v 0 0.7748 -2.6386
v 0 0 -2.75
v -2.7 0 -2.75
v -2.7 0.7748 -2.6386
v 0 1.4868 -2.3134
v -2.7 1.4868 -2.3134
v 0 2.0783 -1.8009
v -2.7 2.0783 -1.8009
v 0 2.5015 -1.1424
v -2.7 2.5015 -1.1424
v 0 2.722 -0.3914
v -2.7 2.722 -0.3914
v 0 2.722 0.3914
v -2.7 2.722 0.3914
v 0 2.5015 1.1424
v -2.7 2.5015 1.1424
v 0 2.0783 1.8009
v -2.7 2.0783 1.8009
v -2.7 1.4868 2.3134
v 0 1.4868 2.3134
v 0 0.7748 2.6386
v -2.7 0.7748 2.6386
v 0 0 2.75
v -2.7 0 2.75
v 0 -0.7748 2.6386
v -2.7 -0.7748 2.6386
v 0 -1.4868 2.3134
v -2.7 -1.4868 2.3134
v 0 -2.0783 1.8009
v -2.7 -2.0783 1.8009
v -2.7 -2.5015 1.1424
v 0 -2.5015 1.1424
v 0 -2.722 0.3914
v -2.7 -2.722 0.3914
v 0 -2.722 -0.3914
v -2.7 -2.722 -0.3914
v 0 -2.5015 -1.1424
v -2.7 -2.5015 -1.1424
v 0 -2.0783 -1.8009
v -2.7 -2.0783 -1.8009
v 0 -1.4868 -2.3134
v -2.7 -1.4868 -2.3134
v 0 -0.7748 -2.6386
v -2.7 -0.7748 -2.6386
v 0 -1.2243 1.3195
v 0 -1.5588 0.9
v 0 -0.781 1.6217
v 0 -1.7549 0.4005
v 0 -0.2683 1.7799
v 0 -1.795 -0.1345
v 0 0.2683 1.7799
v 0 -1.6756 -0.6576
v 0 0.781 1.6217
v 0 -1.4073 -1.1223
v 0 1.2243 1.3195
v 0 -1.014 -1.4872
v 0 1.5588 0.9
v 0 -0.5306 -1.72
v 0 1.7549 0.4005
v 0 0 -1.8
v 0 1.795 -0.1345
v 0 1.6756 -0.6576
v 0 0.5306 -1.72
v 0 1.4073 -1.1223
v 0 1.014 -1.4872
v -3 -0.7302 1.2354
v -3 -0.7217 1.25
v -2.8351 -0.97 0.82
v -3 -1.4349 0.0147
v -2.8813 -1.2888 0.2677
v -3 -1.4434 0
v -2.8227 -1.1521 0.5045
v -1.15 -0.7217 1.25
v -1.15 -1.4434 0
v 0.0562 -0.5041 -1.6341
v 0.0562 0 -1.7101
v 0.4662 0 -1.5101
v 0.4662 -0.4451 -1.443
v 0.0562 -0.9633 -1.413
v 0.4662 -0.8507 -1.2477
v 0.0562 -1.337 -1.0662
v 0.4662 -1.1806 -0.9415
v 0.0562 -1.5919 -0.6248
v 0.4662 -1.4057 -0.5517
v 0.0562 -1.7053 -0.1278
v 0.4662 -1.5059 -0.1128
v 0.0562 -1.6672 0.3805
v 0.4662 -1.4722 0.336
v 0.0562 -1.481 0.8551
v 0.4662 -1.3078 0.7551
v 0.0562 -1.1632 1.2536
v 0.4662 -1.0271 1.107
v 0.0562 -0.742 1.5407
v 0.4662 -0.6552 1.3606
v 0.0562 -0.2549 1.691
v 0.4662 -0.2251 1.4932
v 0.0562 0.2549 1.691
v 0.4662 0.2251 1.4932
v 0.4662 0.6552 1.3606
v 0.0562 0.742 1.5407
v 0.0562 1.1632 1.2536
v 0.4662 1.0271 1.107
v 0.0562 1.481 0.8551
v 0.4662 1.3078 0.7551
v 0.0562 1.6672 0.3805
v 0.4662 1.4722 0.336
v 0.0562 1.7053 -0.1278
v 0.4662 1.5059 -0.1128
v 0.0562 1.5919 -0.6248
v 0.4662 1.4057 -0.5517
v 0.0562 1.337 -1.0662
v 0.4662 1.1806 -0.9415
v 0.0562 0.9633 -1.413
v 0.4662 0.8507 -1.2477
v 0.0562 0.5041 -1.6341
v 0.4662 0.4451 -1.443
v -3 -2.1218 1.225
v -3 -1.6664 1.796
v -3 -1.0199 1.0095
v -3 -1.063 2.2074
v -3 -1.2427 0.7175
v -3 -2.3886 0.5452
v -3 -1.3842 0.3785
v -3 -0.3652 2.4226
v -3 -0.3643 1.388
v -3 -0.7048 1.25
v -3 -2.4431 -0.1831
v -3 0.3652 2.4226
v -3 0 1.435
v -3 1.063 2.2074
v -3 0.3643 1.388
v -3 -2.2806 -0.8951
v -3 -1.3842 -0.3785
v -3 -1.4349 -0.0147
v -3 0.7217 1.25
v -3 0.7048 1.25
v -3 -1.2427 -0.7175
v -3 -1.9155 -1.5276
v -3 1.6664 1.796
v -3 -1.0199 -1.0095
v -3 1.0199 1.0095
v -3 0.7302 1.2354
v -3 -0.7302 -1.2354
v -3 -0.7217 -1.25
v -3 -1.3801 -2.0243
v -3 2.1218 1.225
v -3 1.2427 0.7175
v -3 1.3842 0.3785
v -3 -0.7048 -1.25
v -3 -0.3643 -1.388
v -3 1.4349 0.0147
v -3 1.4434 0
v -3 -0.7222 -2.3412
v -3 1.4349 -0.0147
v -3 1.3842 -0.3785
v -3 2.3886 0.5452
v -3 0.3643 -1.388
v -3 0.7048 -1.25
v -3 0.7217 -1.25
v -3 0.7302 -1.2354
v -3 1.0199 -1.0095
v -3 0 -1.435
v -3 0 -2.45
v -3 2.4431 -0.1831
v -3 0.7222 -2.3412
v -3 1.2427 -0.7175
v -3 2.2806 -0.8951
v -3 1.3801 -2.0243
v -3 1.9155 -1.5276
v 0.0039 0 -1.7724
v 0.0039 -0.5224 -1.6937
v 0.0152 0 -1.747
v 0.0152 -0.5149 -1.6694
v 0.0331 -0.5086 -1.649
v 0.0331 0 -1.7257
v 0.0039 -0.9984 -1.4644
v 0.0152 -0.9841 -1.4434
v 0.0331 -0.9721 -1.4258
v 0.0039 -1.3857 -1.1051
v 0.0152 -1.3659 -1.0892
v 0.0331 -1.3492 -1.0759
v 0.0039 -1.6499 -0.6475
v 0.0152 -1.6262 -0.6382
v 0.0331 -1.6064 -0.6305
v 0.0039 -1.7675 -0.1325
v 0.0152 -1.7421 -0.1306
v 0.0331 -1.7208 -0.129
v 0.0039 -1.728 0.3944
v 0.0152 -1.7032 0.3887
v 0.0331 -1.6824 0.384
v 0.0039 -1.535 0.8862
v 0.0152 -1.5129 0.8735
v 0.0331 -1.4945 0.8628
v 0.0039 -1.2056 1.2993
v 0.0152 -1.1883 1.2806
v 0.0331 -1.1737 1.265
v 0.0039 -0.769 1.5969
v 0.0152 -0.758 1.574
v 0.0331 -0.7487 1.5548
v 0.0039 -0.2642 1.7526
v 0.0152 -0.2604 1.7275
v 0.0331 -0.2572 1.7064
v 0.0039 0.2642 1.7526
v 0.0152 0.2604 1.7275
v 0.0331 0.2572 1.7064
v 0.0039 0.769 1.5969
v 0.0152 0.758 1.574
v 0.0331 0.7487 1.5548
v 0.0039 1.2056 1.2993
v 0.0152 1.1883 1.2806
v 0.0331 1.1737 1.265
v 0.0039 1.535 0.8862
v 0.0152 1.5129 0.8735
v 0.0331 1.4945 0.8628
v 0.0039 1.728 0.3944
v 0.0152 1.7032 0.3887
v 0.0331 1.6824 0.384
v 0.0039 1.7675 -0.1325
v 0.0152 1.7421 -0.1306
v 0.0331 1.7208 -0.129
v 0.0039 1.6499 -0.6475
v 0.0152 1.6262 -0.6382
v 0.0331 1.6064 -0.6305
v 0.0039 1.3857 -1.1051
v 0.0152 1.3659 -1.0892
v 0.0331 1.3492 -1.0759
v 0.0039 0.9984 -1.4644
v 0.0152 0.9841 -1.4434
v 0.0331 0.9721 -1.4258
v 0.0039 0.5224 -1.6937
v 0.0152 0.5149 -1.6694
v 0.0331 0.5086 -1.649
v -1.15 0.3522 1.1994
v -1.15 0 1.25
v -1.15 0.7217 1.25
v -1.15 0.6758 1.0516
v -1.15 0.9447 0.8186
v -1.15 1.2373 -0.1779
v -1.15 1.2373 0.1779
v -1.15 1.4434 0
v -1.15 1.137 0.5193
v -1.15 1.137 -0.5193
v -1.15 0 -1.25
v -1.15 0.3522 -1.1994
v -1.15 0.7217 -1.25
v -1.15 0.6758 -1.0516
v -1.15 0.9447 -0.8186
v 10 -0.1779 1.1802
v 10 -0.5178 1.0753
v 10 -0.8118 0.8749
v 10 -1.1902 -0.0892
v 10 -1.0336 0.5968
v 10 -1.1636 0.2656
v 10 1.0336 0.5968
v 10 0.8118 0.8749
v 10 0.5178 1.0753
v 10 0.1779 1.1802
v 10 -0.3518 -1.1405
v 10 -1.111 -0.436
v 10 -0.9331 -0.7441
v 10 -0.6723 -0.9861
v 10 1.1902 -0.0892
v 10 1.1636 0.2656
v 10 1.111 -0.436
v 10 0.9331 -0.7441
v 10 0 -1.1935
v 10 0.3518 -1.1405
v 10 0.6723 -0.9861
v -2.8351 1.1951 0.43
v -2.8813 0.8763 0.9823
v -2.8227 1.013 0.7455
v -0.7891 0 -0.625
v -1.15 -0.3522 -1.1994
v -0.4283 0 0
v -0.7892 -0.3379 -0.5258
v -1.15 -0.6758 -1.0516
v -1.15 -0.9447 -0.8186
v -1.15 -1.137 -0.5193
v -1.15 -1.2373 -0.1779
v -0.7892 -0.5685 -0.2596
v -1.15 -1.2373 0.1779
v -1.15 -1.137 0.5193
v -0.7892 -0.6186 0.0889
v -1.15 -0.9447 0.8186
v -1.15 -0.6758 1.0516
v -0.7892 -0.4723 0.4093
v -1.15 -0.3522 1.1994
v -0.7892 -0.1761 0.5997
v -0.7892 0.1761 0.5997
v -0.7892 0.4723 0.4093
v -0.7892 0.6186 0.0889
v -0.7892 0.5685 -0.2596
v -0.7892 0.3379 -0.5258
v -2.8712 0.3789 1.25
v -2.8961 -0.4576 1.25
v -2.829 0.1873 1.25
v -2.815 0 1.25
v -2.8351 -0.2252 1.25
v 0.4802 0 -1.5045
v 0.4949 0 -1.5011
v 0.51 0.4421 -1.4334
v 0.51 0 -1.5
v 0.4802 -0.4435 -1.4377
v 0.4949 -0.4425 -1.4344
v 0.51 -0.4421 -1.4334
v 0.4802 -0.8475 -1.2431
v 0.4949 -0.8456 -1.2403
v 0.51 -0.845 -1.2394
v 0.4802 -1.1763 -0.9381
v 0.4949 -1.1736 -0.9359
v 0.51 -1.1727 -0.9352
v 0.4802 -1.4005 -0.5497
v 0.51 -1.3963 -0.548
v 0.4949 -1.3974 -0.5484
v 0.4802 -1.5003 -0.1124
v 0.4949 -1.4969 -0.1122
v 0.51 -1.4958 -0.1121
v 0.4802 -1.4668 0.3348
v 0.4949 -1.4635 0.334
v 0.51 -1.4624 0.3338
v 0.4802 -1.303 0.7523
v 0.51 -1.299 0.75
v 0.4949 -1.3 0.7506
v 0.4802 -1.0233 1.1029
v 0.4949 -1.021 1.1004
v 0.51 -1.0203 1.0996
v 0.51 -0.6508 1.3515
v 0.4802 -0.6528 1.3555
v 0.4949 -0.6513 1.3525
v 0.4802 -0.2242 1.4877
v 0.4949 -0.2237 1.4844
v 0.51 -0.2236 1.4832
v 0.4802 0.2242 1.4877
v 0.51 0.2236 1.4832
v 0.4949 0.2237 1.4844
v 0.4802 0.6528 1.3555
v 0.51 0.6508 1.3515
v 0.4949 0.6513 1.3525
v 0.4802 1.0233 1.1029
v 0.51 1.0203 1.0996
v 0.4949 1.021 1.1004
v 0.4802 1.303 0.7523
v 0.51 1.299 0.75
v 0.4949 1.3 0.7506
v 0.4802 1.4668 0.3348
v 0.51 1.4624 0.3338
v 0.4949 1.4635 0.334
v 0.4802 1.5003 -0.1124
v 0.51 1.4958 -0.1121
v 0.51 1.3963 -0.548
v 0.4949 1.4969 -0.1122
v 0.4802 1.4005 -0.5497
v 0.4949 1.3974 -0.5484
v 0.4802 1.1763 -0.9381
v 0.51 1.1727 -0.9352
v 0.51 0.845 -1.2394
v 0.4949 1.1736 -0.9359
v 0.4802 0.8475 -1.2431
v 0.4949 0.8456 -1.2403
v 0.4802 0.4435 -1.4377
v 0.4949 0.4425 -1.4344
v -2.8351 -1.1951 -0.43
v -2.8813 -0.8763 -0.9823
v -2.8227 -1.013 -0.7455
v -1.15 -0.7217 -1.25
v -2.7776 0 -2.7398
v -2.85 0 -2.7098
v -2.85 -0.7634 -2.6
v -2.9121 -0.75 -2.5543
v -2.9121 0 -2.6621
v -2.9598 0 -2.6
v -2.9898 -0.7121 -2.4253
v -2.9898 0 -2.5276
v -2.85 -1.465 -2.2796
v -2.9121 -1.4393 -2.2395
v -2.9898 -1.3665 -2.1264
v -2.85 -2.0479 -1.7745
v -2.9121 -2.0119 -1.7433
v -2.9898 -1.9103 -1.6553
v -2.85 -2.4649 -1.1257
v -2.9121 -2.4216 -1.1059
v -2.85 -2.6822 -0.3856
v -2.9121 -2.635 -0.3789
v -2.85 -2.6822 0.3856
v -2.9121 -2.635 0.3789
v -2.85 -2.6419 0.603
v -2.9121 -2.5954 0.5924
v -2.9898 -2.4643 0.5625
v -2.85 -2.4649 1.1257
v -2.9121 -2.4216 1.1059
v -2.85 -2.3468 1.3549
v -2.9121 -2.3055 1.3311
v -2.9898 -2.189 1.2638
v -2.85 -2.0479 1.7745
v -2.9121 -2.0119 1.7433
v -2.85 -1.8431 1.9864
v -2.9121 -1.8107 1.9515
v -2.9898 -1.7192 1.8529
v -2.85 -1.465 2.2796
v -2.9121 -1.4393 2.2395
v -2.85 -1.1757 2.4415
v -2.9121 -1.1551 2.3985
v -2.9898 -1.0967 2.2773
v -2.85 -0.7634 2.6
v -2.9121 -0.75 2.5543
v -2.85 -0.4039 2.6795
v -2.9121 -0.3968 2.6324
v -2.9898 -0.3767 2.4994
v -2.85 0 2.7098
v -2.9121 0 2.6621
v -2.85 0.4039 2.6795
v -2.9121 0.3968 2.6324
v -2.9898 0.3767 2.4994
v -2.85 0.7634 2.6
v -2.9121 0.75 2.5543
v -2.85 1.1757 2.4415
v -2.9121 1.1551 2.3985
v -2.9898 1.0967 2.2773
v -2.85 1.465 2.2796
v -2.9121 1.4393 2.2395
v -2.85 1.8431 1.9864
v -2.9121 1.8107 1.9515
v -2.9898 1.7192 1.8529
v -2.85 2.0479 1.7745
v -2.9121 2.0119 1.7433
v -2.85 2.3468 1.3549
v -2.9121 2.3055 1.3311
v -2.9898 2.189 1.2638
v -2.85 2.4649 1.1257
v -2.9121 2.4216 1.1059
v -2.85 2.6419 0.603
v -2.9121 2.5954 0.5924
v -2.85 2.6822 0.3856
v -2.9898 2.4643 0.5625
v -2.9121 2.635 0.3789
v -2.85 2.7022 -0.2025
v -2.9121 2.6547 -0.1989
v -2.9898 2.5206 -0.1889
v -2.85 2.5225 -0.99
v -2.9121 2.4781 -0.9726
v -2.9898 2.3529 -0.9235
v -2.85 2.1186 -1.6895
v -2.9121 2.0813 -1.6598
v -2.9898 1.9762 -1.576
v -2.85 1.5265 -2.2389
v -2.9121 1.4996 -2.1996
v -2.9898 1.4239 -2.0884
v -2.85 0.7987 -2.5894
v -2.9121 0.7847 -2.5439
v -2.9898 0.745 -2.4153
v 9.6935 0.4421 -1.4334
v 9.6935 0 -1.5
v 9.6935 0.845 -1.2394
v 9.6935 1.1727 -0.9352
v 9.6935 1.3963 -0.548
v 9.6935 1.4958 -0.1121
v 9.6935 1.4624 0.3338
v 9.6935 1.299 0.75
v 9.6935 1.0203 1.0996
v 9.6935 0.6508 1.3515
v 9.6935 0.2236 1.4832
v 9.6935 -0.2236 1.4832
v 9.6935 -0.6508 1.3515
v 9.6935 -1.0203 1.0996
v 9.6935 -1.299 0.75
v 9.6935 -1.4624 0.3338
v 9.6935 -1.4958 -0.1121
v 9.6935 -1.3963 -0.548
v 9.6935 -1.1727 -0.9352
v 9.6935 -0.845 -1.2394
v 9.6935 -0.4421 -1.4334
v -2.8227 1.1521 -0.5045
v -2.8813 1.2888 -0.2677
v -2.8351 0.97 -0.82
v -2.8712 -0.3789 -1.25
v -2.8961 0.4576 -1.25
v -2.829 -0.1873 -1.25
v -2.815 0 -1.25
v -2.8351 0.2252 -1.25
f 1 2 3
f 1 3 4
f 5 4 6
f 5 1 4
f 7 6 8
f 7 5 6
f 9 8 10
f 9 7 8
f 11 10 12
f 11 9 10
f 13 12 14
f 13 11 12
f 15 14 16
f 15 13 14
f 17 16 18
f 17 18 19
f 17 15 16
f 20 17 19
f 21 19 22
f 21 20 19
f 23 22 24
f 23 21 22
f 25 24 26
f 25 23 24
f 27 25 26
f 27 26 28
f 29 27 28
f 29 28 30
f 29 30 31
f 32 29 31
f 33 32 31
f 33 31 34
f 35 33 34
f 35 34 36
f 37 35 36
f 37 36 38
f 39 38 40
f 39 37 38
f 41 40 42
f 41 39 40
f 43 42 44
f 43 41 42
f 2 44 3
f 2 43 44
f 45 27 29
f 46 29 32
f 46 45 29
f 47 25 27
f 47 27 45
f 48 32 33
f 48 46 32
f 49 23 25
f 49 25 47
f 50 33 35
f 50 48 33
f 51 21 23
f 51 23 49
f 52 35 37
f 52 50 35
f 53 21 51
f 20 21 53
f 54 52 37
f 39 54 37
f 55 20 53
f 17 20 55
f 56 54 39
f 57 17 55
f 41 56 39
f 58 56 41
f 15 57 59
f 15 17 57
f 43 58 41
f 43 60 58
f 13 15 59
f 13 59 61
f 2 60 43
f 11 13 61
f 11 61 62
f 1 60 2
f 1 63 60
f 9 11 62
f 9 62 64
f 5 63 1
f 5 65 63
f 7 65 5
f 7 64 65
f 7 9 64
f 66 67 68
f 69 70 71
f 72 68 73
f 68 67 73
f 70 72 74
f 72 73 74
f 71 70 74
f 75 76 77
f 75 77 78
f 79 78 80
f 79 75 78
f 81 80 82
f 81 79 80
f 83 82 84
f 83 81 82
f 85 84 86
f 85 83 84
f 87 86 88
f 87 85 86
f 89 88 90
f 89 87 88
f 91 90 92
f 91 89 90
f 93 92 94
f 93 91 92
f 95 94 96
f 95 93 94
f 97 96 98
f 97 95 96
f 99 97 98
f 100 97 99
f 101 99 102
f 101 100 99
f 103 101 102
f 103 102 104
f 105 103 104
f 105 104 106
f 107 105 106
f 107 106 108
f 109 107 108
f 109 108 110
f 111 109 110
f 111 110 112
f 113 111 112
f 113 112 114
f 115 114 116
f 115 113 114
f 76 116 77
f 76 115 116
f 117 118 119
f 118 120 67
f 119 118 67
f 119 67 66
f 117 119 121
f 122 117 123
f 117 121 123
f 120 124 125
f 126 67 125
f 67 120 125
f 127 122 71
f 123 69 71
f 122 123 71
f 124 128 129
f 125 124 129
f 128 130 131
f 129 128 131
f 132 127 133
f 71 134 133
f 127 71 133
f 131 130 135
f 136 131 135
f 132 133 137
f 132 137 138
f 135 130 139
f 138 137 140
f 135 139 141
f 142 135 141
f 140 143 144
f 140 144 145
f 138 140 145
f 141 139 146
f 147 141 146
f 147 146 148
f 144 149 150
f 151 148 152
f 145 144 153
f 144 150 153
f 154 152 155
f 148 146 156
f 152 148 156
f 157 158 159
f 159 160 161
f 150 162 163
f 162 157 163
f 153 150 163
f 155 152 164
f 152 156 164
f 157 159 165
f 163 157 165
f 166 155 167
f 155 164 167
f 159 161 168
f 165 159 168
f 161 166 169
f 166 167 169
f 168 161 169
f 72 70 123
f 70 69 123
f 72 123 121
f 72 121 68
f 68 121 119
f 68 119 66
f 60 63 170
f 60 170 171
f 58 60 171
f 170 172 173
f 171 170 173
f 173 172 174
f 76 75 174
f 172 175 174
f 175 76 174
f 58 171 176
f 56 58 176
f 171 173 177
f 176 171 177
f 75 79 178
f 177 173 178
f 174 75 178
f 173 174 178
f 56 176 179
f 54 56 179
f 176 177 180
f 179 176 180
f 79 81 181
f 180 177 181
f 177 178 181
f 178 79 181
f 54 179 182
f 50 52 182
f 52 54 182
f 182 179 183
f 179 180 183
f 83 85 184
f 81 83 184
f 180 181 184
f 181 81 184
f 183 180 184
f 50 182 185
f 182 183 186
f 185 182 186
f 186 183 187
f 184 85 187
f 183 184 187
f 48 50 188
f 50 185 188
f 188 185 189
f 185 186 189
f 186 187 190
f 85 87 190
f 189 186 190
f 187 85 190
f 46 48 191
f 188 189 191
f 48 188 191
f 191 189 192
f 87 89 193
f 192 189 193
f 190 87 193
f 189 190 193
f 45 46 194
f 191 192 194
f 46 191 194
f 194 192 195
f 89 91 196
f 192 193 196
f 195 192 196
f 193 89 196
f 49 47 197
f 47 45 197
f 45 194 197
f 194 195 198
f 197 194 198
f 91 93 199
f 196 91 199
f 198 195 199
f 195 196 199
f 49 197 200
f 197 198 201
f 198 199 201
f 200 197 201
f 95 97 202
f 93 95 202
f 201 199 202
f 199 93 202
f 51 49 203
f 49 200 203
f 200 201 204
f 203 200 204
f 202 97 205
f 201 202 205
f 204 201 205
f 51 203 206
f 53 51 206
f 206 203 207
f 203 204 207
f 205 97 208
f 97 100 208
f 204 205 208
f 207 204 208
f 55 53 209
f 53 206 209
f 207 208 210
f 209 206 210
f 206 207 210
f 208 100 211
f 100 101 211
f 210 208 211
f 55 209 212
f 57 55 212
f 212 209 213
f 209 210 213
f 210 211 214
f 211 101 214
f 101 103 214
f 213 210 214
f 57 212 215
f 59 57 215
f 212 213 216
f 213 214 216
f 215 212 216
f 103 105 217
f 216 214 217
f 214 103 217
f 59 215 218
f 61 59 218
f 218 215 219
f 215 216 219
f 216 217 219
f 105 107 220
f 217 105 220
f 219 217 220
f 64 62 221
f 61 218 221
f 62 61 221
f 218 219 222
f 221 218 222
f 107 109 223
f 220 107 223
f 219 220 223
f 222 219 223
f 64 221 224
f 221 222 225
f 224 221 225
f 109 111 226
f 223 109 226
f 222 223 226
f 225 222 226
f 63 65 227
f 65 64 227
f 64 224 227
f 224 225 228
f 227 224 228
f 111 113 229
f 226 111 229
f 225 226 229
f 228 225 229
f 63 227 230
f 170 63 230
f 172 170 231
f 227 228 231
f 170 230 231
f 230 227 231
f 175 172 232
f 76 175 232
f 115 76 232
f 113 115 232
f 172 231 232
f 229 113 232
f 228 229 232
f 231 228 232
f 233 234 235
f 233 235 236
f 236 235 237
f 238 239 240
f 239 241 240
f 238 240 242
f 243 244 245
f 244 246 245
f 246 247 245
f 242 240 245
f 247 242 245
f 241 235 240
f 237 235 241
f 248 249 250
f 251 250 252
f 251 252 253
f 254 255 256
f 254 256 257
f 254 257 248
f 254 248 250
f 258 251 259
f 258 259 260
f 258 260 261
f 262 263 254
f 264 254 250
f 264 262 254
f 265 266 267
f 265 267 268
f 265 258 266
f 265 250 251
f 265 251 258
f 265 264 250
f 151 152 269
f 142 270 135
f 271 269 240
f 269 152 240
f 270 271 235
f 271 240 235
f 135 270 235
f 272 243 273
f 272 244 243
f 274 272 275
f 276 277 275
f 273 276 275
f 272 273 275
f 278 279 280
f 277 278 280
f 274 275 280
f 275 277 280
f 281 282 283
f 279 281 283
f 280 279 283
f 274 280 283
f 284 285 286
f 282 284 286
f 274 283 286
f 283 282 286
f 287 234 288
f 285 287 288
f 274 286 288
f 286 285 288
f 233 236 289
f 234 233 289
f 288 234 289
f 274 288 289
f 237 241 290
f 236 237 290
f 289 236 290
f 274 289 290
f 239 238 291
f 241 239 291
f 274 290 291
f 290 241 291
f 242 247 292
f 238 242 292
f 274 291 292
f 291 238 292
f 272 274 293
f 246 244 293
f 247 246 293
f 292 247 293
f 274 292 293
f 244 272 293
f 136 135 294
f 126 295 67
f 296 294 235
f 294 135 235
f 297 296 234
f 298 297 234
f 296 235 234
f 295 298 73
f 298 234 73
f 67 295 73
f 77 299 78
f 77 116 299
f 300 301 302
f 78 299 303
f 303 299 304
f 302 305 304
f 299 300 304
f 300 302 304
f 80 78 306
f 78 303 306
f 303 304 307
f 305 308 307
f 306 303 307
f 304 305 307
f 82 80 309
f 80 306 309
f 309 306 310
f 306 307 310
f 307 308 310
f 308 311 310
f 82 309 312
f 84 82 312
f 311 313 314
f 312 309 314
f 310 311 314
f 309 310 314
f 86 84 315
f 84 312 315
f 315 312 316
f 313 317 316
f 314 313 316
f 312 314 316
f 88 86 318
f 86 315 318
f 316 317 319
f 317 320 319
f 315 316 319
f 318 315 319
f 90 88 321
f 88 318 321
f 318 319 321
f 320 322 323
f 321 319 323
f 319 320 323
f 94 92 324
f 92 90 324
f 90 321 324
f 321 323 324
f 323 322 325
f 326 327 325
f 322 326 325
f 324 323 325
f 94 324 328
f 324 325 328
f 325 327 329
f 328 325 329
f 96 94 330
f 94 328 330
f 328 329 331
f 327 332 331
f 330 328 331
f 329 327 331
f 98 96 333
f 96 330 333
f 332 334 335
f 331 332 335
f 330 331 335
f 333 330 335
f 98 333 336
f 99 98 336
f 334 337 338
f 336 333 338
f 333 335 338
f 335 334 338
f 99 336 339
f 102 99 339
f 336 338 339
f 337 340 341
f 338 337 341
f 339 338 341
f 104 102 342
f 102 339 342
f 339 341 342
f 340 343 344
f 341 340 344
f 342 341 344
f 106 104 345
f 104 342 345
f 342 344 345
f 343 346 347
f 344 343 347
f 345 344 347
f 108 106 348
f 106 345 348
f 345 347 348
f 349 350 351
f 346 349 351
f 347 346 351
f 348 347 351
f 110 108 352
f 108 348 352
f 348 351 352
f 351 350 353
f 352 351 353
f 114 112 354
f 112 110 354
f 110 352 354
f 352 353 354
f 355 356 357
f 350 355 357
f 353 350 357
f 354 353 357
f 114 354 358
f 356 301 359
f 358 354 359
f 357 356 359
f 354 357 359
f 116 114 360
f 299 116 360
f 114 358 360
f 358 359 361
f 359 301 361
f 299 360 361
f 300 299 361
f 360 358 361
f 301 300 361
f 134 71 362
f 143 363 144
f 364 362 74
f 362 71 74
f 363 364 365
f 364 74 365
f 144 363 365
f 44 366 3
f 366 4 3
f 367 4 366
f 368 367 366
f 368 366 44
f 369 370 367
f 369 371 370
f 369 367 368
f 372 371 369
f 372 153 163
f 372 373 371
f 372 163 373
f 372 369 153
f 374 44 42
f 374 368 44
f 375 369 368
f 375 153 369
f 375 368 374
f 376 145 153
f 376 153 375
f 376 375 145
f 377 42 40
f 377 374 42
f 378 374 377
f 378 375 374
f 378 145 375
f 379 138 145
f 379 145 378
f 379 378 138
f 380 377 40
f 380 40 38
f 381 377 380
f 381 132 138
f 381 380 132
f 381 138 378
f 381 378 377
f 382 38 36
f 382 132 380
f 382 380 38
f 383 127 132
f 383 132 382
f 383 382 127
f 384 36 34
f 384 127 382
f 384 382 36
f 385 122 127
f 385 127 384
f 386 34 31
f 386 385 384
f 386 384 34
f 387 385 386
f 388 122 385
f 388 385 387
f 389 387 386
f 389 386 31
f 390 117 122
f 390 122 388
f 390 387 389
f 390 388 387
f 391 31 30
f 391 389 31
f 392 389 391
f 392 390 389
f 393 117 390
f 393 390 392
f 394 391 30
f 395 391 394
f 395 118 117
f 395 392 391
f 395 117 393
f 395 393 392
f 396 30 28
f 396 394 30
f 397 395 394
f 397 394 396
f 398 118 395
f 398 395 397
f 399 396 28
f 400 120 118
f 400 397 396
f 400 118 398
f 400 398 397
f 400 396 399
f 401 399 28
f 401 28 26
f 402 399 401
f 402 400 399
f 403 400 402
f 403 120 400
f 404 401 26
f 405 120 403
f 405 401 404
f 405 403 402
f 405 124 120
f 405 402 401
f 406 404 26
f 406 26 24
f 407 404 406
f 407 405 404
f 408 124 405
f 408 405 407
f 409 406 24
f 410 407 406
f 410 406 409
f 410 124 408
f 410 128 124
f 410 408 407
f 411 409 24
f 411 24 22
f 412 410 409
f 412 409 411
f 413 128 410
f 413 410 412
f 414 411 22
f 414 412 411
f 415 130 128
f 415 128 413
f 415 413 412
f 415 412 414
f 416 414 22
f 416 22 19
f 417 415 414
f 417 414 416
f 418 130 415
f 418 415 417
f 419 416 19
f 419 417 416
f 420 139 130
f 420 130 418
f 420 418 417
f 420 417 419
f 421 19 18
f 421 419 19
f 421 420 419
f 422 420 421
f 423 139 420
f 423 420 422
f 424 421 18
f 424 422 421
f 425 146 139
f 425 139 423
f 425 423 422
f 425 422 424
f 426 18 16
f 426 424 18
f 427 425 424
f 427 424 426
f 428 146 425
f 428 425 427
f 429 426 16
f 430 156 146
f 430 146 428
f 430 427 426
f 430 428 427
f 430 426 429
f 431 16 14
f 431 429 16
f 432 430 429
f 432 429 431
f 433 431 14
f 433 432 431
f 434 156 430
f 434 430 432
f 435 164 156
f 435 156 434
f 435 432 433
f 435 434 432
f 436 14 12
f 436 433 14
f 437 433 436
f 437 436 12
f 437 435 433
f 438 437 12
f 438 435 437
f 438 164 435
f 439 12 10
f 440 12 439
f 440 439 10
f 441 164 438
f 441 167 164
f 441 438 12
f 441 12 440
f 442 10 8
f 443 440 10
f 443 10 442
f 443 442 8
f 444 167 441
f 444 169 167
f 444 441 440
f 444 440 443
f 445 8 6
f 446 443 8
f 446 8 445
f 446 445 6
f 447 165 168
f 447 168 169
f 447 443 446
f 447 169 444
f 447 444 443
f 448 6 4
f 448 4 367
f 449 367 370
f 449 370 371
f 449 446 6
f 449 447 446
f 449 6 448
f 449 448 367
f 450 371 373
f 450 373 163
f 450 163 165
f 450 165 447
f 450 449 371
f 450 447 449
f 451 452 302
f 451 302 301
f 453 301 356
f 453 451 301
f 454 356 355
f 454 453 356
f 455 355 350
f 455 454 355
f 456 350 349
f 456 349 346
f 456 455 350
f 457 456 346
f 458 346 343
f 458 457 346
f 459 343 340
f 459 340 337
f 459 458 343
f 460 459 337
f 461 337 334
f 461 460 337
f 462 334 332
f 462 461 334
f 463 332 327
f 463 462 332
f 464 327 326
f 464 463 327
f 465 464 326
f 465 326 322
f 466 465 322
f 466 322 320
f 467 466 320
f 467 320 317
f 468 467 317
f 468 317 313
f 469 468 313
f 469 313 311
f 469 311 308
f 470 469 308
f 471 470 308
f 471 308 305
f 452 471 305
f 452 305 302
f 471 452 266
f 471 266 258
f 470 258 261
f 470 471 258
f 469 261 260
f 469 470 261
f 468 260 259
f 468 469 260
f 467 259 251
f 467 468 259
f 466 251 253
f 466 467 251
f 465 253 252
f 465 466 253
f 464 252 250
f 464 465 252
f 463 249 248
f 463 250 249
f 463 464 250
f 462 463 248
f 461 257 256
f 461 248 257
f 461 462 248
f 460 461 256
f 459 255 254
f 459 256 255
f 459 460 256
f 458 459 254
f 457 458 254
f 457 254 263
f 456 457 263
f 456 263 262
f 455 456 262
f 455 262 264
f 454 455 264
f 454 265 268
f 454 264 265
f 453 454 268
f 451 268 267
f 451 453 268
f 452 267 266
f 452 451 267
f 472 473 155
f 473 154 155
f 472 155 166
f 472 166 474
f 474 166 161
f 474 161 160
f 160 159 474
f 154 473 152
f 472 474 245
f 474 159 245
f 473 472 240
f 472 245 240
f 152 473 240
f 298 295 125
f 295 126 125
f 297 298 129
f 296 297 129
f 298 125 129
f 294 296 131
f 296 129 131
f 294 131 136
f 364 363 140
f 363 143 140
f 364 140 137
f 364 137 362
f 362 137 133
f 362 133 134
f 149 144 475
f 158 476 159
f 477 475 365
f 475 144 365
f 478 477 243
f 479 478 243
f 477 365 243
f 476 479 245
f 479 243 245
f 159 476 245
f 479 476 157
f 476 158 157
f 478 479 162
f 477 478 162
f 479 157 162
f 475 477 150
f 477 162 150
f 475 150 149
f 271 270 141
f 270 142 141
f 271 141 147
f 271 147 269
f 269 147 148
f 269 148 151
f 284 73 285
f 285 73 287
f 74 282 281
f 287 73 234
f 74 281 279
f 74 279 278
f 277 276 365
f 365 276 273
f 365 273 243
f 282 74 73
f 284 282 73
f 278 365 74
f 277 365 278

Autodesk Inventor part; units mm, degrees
sketch "Sketch_1" plane through (0, 0, 0) normal (0, 1, 0) x (-1, 0, 0)
  line L0 (-10, 0) -> (6, 0)
  line L1 (0.4283, 0) -> (1.15, -1.25)
  line L2 (1.15, -1.25) -> (2.815, -1.25)
  line L3 (2.815, -1.25) -> (3, -1.435)
  line L4 (3, -1.435) -> (3, -2.45)
  arc A0 (2.7, -2.75) -> (3, -2.45) centre (2.7, -2.45) ccw
  line L5 (2.7, -2.75) -> (0, -2.75)
  line L6 (0, -2.75) -> (0, -1.8)
  arc A1 (0, -1.8) -> (-0.0562, -1.7101) centre (-0.1, -1.8) ccw
  line L7 (-0.0562, -1.7101) -> (-0.4662, -1.5101)
  arc A2 (-0.4662, -1.5101) -> (-0.51, -1.5) centre (-0.51, -1.6) ccw
  line L8 (-0.51, -1.5) -> (-9.6935, -1.5)
  line L9 (-9.6935, -1.5) -> (-10, -1.1935)
  line L10 (-10, -1.1935) -> (-10, 0)
  line L11 (-10, 0) -> (0.4283, 0)
revolve "Revolution1" add sketch "Sketch_1" angle 360 about axis through (10, 0, 0) along (1, 0, 0)
thread "Thread1" size "M3x0.5" class "6g" standard "ISO Metric profile" length 7.6835
sketch "Skizze_1" plane through (-1.15, 0, 0) normal (1, 0, 0) x (0, 0, -1)
  line L0 (-1.25, -0.7217) -> (0, -1.4434)
  line L1 (0, -1.4434) -> (1.25, -0.7217)
  line L2 (1.25, -0.7217) -> (1.25, 0.7217)
  line L3 (1.25, 0.7217) -> (0, 1.4434)
  line L4 (0, 1.4434) -> (-1.25, 0.7217)
  line L5 (-1.25, 0.7217) -> (-1.25, -0.7217)
extrude "Extrusion1" cut sketch "Skizze_1" against normal blind 2.6
ref_plane "IP1_XY" through (0, 0, 0) normal (1, 0, 0) x (0, 0, -1)
ref_plane "IP1_YZ" through (0, 0, 0) normal (0, 0, -1) x (0, 1, 0)
ref_plane "IP1_ZX" through (0, 0, 0) normal (0, 1, 0) x (1, 0, 0)
ref_plane "IP2_XY" through (-3, 0, 0) normal (1, 0, 0) x (0, 0, -1)
ref_plane "IP2_YZ" through (-3, 0, 0) normal (0, 0, -1) x (0, 1, 0)
ref_plane "IP2_ZX" through (-3, 0, 0) normal (0, 1, 0) x (1, 0, 0)
ref_plane "IP3_XY" through (10, 0, 0) normal (1, 0, 0) x (0, 0, -1)
ref_plane "IP3_YZ" through (10, 0, 0) normal (0, 0, -1) x (0, 1, 0)
ref_plane "IP3_ZX" through (10, 0, 0) normal (0, 1, 0) x (1, 0, 0)
ref_plane "IP4_XY" through (0, 0, 0) normal (1, 0, 0) x (0, 0, -1)
ref_plane "IP4_YZ" through (0, 0, 0) normal (0, 0, -1) x (0, 1, 0)
ref_plane "IP4_ZX" through (0, 0, 0) normal (0, 1, 0) x (1, 0, 0)
properties part number "Slotted head cap screw ISO 4762 - M3x10"
